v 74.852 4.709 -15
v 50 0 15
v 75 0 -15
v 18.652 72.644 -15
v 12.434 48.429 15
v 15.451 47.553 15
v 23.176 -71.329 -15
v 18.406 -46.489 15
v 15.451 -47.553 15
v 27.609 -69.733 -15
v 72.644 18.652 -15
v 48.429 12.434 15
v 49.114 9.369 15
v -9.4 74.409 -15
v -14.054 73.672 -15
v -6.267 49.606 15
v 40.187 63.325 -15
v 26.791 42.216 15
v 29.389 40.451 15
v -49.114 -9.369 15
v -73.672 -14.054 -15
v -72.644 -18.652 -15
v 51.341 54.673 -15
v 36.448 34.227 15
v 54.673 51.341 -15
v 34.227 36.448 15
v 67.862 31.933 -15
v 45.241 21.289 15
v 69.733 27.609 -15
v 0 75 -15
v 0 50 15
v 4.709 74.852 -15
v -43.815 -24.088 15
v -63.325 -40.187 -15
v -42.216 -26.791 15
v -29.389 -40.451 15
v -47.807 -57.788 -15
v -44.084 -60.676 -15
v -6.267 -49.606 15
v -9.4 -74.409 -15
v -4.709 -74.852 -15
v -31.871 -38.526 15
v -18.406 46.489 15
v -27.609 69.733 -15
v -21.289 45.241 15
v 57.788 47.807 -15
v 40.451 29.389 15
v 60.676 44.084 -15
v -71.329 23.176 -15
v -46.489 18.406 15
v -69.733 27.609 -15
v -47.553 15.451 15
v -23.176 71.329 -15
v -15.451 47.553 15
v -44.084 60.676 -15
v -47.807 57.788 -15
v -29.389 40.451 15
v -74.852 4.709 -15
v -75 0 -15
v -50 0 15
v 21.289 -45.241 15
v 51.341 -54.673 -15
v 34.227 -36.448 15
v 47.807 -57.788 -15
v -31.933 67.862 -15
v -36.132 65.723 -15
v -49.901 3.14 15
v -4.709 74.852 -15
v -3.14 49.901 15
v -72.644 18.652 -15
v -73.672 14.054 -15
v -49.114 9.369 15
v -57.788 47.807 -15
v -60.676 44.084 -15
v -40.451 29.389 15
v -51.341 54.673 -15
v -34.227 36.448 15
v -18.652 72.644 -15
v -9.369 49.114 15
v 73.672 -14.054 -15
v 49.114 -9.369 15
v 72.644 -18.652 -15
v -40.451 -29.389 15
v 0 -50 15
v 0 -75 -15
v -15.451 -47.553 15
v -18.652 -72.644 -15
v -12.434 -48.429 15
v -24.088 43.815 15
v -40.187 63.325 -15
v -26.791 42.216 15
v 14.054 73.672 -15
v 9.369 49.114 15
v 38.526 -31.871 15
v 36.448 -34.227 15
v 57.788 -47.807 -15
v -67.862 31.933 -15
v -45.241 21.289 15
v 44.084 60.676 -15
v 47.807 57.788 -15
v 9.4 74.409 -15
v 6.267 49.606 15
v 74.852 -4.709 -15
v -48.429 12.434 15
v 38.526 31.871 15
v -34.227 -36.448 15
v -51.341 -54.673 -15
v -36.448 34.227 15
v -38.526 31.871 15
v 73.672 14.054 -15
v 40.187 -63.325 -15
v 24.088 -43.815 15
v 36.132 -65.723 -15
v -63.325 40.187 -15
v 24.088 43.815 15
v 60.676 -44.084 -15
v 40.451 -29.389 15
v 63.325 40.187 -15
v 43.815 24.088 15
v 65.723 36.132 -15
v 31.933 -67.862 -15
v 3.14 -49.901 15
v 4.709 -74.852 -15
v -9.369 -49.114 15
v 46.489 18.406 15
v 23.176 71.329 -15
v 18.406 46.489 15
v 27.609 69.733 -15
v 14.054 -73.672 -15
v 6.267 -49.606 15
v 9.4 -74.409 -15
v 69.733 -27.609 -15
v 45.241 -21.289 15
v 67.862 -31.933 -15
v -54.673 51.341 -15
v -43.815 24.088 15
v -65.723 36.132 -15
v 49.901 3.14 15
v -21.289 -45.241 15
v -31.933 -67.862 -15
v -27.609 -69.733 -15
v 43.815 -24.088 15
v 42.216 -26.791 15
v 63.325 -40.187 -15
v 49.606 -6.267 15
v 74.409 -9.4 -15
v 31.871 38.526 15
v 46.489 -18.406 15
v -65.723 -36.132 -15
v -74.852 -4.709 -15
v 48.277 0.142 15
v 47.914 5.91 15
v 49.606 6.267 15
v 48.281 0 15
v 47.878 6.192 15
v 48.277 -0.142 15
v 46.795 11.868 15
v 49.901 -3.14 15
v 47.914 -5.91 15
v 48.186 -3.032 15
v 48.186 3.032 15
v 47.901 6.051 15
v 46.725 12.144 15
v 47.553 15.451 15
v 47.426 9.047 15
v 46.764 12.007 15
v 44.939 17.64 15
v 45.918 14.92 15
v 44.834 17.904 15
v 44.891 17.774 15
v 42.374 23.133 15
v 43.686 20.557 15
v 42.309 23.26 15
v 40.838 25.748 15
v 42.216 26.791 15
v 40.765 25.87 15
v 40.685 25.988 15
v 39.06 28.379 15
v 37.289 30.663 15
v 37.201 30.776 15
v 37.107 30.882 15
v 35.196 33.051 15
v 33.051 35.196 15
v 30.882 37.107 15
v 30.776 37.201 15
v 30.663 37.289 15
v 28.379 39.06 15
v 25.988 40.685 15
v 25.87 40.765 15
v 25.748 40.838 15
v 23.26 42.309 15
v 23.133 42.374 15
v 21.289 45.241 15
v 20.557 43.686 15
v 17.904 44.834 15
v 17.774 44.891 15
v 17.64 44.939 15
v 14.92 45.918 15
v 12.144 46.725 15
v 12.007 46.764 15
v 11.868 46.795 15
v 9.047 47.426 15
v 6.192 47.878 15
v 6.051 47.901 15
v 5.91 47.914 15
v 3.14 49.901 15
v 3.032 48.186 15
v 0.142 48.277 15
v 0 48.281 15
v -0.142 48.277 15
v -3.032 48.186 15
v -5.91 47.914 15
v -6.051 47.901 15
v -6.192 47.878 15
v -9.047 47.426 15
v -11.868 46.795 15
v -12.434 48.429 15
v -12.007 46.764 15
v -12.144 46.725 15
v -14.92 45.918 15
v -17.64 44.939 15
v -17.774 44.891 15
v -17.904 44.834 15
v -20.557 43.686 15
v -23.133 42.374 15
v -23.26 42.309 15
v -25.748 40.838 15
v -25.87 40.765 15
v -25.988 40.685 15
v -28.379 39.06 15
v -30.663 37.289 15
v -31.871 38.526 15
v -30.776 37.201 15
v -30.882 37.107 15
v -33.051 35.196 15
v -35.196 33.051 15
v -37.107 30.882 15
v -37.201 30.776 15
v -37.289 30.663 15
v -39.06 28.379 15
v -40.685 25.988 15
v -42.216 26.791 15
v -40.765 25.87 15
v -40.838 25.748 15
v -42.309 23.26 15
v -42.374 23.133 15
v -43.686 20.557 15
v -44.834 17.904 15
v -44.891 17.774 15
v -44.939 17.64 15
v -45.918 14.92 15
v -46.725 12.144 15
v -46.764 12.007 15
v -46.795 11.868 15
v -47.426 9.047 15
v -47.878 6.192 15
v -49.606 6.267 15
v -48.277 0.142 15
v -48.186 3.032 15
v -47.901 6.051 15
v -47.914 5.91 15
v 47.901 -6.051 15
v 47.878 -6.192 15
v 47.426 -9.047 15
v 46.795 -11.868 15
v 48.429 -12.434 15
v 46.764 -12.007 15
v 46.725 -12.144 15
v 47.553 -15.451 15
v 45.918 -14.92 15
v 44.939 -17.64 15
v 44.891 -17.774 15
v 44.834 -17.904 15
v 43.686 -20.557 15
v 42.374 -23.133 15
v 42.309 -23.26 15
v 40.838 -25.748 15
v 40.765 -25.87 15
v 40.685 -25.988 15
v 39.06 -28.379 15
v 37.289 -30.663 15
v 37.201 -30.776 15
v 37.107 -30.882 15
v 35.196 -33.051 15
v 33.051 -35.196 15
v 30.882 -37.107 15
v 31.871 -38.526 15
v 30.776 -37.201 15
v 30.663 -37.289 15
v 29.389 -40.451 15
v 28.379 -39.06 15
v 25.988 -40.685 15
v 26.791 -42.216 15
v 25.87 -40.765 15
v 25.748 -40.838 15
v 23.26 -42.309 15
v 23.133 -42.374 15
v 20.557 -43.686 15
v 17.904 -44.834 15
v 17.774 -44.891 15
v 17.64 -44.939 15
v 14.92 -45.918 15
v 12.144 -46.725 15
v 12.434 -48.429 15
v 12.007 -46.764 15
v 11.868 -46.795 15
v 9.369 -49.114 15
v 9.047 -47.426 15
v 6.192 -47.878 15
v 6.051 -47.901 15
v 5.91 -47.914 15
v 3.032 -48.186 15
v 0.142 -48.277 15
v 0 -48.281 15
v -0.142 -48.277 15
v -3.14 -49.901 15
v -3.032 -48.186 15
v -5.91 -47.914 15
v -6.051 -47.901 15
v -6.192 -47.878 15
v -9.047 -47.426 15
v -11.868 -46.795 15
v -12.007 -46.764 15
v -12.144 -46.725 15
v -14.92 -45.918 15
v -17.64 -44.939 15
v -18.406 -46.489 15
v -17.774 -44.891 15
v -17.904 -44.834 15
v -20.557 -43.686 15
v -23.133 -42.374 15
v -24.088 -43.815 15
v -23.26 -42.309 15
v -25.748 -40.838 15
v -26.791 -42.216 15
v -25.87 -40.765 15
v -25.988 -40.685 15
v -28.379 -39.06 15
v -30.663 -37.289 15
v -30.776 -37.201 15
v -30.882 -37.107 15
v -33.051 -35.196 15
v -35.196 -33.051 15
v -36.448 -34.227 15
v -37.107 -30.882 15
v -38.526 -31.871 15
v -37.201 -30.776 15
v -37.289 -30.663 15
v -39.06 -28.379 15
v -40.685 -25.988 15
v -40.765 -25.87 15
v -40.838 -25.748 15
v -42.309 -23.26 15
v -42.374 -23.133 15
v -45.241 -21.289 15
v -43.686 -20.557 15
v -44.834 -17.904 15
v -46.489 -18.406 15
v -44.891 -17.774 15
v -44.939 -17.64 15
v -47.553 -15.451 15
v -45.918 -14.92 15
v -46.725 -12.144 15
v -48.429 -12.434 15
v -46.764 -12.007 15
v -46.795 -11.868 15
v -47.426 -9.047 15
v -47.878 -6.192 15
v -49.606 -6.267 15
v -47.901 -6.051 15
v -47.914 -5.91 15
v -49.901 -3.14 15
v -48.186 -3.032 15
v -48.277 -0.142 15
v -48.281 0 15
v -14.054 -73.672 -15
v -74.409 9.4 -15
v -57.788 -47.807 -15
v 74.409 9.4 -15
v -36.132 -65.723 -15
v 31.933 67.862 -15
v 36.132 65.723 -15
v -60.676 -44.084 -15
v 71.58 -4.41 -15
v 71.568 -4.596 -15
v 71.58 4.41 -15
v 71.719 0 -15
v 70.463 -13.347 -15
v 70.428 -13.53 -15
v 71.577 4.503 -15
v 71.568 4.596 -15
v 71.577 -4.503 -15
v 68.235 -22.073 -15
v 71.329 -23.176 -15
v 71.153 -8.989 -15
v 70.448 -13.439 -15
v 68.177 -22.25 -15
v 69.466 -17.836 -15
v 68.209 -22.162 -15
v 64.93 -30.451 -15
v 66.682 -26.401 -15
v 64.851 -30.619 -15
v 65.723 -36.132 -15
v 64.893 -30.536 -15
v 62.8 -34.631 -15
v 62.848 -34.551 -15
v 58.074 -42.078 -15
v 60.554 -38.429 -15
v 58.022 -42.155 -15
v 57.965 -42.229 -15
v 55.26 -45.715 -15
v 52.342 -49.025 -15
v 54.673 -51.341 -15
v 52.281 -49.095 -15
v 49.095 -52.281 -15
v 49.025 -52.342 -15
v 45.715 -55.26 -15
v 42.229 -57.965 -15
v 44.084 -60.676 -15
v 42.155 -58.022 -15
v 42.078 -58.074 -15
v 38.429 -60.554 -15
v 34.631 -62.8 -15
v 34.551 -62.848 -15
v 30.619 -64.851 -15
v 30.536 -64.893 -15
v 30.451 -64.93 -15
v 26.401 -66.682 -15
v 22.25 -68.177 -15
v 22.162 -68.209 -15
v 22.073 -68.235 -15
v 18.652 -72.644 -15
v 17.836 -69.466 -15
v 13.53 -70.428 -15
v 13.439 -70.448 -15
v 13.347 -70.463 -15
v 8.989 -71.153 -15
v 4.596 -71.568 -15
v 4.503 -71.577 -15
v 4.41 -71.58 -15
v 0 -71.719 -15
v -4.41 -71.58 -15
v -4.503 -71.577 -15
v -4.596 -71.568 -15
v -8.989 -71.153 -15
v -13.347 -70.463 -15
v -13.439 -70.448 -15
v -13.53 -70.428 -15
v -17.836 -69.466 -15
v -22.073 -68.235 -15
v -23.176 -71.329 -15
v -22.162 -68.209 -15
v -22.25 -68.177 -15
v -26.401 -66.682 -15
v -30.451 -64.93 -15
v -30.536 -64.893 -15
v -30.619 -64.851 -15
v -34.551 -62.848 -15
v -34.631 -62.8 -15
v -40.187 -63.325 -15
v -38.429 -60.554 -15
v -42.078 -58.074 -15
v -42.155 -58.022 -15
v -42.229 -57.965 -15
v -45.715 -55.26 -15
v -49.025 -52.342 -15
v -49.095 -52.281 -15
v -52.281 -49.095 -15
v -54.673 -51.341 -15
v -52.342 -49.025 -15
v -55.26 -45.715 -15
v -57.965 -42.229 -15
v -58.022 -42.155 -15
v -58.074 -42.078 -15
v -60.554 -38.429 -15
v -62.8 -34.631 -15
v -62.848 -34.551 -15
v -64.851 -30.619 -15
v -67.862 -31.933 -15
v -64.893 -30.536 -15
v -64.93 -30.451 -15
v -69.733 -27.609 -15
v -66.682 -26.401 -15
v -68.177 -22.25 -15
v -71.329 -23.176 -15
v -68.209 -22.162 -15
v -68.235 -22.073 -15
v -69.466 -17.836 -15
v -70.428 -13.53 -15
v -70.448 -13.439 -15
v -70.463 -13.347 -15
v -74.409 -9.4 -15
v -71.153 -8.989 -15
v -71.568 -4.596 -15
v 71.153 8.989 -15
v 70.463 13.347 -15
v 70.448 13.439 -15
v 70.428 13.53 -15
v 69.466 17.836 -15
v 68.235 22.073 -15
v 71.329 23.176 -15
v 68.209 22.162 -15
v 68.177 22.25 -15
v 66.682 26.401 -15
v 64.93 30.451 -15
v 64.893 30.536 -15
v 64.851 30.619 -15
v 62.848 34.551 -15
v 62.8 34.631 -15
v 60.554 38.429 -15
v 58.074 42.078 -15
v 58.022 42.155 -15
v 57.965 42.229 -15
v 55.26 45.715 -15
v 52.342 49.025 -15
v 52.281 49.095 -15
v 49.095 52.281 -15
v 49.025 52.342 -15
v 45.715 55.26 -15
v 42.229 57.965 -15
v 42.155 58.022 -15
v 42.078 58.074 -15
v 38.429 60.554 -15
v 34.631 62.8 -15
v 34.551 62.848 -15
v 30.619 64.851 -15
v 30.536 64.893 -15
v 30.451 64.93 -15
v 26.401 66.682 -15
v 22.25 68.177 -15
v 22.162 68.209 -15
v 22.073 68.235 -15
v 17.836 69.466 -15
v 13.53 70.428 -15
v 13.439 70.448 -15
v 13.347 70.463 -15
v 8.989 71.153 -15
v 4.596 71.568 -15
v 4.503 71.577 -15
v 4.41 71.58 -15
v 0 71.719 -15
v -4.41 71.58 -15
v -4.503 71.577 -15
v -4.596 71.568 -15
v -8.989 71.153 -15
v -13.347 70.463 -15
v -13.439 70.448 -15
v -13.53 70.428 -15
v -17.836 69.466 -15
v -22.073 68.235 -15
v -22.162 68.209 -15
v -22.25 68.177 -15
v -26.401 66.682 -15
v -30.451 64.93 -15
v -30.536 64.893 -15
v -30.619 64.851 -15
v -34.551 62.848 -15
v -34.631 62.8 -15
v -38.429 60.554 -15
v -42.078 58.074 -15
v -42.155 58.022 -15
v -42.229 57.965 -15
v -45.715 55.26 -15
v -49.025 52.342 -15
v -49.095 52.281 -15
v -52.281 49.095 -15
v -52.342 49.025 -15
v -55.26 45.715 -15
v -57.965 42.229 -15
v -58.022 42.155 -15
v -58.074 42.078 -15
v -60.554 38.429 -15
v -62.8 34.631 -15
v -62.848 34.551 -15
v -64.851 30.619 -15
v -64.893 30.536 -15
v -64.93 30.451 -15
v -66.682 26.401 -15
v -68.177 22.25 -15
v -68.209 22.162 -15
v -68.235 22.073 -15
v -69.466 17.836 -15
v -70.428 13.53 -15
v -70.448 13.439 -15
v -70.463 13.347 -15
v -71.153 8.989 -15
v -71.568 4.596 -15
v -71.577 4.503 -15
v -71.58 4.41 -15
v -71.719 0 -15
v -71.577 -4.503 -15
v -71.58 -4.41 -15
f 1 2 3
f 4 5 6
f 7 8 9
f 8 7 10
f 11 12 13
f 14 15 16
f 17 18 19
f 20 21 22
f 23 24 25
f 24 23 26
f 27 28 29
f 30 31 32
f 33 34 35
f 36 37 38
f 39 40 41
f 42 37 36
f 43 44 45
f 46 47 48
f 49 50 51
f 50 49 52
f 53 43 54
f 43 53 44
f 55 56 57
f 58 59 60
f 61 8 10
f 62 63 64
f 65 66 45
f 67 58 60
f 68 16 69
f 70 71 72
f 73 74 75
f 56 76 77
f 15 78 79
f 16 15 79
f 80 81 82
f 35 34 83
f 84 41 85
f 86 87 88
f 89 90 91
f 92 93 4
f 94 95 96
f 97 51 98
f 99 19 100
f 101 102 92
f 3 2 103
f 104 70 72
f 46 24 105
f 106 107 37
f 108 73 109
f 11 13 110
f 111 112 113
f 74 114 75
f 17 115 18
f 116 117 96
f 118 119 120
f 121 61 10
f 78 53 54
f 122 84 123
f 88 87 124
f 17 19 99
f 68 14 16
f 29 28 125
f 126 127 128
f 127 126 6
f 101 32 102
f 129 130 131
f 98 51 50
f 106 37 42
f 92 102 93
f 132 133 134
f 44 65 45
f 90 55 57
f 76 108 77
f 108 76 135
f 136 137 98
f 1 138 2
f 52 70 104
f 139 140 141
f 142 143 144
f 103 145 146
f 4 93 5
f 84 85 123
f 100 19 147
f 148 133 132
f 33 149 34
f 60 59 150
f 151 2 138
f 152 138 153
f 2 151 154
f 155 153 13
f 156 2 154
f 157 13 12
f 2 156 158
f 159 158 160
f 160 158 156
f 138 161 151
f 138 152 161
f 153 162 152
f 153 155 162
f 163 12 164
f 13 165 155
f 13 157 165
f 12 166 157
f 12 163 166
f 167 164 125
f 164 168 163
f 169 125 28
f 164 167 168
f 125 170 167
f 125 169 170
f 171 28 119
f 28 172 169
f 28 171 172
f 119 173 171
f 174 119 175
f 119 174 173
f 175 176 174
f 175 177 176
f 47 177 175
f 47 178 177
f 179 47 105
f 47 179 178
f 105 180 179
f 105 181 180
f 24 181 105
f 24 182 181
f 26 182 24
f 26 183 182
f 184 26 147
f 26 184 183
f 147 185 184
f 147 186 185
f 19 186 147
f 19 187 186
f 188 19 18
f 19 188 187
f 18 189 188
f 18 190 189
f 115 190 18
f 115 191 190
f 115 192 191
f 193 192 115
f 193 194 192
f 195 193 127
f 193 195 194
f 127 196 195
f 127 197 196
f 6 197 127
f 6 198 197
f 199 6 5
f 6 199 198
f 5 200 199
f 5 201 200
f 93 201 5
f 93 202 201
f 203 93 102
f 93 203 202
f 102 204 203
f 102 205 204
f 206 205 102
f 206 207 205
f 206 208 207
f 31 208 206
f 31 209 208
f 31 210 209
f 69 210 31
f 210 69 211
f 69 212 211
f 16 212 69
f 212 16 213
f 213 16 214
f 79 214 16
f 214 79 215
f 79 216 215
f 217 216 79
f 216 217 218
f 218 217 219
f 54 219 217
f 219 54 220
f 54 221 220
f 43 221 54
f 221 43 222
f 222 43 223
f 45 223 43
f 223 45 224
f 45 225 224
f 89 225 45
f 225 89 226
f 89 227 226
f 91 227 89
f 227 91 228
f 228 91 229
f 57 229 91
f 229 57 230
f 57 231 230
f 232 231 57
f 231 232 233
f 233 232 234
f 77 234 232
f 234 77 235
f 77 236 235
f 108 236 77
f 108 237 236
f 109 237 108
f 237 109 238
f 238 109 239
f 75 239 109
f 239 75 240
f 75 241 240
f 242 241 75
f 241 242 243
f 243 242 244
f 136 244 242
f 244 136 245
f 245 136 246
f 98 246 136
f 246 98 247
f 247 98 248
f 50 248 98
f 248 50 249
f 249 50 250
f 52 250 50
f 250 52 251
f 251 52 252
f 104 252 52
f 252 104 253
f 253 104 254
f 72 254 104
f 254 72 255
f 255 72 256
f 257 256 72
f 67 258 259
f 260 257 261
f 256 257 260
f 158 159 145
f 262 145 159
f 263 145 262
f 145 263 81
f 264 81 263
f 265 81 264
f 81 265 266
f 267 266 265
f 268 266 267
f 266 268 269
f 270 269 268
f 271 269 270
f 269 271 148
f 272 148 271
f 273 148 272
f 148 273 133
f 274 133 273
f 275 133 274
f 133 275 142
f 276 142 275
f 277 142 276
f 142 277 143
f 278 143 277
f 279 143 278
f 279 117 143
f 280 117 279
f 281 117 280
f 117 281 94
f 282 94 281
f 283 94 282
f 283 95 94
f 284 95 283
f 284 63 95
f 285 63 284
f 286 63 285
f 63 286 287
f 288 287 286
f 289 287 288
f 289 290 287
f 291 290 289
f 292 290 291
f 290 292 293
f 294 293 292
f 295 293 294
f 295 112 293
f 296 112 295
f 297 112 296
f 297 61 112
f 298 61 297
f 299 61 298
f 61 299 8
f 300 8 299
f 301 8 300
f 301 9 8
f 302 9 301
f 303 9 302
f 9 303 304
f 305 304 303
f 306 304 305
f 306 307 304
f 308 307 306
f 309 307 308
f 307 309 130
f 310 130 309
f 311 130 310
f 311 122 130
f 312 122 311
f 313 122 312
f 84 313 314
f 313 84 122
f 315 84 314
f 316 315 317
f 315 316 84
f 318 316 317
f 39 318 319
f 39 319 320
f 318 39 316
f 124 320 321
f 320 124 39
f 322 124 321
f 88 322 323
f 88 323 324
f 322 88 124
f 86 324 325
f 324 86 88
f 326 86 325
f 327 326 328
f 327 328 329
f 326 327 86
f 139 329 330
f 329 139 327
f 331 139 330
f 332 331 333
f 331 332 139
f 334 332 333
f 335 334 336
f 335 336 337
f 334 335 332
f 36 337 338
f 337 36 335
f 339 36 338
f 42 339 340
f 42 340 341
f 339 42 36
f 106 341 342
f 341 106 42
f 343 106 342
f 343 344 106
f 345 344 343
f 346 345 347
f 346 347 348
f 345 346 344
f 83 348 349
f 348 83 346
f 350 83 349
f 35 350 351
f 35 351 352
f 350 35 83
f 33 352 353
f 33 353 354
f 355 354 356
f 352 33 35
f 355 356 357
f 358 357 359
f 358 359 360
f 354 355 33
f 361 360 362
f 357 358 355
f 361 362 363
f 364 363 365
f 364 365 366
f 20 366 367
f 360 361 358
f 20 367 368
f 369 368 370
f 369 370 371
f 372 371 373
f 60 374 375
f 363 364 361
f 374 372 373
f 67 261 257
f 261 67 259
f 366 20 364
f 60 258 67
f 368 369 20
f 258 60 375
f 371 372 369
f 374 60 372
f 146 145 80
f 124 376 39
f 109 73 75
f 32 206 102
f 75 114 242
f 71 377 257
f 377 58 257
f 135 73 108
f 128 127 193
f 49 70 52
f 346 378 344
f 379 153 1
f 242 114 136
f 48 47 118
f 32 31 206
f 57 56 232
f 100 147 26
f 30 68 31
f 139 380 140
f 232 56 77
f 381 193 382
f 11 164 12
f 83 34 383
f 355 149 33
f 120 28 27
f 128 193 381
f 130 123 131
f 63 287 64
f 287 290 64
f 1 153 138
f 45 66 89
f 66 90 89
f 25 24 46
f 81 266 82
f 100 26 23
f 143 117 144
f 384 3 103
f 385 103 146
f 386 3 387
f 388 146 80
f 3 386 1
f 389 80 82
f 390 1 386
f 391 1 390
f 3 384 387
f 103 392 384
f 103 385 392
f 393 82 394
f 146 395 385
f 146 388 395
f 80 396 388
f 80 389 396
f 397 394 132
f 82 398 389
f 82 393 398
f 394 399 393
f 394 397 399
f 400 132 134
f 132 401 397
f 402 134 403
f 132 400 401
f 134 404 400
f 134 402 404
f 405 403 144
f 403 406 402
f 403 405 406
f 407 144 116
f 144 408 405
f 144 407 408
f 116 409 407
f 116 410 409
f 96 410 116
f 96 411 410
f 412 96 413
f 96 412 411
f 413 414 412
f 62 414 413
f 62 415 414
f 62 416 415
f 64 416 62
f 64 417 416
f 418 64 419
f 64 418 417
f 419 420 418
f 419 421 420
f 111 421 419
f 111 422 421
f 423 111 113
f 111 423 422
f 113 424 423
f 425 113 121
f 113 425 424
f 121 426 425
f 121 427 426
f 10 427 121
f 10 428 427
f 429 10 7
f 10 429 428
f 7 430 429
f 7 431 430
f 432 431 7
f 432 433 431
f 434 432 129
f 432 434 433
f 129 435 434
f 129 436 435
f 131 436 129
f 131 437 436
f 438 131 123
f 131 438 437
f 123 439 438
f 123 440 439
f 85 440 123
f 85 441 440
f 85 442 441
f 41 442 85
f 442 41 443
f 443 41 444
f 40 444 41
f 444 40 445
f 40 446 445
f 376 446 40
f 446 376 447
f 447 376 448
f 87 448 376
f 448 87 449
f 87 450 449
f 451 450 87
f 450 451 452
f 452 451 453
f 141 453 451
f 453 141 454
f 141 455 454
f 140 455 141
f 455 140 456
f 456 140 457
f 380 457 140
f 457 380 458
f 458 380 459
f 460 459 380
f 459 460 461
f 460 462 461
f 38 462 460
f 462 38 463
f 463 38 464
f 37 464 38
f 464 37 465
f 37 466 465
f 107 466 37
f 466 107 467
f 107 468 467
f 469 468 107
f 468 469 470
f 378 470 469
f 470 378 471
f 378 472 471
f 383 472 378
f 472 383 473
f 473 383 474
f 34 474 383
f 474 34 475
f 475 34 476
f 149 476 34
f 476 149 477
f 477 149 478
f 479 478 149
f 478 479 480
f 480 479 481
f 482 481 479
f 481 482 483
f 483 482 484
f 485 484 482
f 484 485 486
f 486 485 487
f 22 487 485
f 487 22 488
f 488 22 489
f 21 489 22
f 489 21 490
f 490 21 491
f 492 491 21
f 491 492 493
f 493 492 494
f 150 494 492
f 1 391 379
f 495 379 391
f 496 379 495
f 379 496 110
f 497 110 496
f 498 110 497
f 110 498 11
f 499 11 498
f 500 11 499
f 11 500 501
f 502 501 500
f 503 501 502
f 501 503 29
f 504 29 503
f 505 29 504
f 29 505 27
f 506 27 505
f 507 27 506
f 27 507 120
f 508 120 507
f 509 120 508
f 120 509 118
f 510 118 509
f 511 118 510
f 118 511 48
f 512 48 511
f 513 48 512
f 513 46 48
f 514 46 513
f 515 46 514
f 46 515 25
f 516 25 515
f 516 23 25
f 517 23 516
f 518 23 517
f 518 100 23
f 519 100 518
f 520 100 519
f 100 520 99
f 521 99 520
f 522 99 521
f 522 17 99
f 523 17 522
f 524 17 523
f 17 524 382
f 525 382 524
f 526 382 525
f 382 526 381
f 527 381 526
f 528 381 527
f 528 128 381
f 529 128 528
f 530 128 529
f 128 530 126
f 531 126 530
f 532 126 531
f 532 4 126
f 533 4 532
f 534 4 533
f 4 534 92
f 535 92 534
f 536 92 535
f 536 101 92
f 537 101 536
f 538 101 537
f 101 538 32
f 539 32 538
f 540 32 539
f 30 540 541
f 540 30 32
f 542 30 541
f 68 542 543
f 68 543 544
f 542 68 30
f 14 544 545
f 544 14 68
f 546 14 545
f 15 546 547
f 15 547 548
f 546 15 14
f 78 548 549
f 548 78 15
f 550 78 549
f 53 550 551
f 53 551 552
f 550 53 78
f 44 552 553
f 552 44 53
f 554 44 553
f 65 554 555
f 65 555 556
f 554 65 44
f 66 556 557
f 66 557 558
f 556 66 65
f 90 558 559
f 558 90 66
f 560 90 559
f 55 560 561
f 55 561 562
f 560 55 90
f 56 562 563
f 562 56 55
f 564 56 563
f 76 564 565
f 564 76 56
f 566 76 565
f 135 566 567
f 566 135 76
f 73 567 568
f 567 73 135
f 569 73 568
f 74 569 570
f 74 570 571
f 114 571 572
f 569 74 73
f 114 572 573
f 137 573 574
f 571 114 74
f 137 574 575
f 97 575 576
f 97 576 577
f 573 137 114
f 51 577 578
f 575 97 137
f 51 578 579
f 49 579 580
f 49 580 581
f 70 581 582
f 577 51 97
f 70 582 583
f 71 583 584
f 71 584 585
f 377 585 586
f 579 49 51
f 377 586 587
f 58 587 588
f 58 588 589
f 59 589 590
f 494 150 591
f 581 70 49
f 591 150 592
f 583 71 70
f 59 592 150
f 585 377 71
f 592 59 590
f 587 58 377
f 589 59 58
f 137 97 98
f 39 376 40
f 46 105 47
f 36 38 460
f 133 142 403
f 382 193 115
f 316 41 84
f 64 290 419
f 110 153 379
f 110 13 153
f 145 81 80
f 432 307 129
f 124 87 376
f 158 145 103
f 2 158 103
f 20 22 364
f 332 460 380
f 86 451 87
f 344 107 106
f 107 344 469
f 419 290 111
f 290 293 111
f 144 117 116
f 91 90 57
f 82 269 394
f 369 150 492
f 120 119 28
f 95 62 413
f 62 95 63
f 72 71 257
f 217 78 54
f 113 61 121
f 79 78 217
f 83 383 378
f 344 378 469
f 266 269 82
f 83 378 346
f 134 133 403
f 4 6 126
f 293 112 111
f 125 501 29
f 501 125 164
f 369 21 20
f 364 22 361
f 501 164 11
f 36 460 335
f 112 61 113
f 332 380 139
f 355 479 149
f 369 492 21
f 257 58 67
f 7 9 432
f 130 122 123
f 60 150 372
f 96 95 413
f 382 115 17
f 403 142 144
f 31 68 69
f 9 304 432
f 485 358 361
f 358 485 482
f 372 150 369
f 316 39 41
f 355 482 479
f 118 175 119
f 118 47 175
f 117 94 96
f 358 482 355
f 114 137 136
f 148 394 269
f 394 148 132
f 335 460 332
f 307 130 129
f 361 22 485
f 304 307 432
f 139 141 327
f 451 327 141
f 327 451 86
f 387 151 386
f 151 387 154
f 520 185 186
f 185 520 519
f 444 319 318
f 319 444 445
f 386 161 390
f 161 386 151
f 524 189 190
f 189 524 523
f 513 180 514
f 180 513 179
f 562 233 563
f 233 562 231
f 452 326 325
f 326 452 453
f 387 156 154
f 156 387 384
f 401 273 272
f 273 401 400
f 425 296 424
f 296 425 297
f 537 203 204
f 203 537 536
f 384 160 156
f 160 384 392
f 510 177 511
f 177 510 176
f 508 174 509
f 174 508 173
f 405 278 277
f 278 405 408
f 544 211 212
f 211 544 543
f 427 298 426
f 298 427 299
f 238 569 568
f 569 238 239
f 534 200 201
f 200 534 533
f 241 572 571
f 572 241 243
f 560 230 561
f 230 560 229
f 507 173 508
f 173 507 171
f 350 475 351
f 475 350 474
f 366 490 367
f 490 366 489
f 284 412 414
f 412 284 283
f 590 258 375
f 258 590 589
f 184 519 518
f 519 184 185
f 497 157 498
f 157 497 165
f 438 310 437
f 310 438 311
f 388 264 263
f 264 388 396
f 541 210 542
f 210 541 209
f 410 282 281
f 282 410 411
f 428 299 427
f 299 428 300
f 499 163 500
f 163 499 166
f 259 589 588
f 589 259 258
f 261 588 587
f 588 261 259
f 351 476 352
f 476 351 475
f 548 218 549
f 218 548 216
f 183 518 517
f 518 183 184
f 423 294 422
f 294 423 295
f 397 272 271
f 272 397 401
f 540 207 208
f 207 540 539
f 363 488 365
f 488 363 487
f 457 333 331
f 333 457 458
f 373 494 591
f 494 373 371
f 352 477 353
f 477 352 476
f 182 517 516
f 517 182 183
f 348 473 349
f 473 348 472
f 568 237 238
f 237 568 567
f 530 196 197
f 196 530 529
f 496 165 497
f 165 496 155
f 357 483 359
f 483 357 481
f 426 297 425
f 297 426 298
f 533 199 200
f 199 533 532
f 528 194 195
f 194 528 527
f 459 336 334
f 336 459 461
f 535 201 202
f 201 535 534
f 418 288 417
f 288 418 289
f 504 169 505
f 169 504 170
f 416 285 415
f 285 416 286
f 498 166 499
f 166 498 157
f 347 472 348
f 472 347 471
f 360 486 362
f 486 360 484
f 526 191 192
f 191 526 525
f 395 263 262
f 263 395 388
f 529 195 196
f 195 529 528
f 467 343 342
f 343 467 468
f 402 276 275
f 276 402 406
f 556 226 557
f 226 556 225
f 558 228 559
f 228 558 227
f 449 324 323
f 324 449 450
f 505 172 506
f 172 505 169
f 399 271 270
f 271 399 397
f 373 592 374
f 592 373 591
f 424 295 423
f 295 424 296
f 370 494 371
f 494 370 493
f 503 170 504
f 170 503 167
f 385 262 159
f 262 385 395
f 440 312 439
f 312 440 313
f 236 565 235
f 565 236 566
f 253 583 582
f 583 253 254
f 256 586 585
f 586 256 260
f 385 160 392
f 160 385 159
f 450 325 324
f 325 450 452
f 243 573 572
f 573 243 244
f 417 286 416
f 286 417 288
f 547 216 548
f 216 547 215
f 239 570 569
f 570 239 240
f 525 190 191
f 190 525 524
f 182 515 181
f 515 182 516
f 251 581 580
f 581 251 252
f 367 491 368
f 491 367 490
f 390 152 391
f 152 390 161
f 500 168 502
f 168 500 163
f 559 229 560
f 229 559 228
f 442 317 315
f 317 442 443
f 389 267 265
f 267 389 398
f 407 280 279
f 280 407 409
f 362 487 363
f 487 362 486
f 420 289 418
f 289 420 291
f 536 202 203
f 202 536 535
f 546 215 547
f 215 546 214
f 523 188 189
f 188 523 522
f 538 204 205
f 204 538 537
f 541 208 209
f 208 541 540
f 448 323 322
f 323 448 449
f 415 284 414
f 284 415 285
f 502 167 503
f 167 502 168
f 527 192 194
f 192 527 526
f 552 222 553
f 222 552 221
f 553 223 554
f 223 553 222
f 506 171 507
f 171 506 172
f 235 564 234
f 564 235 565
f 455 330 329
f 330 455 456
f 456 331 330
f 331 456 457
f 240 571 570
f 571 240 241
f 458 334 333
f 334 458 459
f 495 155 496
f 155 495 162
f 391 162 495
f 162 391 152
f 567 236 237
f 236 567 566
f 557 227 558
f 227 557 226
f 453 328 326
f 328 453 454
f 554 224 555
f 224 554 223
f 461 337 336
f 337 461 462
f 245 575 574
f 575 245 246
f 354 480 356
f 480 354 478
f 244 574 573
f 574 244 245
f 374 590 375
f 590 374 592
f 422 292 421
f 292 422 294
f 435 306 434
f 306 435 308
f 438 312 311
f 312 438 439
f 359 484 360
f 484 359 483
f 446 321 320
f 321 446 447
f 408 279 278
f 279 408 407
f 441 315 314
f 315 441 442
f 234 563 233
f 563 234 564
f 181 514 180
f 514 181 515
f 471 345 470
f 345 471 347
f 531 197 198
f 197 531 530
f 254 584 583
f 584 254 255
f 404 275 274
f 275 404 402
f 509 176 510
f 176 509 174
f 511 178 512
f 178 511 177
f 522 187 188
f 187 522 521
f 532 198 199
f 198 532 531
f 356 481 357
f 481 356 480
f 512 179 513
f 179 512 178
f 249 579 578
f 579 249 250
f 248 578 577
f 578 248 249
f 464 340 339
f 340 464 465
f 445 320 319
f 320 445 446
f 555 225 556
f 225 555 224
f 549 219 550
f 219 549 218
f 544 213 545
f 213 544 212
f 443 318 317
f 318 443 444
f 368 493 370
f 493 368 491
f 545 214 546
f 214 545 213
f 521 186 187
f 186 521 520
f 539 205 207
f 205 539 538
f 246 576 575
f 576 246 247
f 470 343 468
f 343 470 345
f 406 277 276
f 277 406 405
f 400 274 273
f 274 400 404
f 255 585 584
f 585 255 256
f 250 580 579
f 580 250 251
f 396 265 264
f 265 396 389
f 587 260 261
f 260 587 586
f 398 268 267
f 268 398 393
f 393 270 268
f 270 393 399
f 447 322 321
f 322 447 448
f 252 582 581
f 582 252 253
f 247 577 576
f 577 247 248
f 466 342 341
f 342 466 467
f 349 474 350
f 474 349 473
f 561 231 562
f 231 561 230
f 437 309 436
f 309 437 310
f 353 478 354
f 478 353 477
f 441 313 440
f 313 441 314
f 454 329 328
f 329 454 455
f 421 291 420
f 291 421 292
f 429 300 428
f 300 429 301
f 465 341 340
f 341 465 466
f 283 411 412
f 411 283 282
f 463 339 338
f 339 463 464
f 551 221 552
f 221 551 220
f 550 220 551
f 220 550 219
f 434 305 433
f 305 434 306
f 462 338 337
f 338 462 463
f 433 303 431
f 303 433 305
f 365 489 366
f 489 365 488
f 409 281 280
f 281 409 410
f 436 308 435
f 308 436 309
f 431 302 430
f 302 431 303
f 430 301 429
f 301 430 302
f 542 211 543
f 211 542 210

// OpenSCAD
/***********************************************************************
Name ......... : exerciseBallStand.scad
Description....: Exercise Ball Stand
Author ....... : Garrett Melenka
Version ...... : V1.0 2016/11/11
Licence ...... : GPL
***********************************************************************/

//Max diameter at base of stand
maxDiameter = 150;

//Min diameter at top of stand
minDiameter = 100;
//Height of stand
height = 30;

//Thickness of stand
thickness = 5;

//Number of facets of circular features
facets = 100;

module ballStand()
{
    difference(){
    cylinder(r1=maxDiameter*0.5,r2=minDiameter*0.5, h=height, center = true, $fn = facets);
    
    cylinder(r1=maxDiameter*0.5 - thickness*0.5,r2 = minDiameter*0.5-thickness*0.5,  h = height+2, center = true, $fn = facets);
    }
}


ballStand();
